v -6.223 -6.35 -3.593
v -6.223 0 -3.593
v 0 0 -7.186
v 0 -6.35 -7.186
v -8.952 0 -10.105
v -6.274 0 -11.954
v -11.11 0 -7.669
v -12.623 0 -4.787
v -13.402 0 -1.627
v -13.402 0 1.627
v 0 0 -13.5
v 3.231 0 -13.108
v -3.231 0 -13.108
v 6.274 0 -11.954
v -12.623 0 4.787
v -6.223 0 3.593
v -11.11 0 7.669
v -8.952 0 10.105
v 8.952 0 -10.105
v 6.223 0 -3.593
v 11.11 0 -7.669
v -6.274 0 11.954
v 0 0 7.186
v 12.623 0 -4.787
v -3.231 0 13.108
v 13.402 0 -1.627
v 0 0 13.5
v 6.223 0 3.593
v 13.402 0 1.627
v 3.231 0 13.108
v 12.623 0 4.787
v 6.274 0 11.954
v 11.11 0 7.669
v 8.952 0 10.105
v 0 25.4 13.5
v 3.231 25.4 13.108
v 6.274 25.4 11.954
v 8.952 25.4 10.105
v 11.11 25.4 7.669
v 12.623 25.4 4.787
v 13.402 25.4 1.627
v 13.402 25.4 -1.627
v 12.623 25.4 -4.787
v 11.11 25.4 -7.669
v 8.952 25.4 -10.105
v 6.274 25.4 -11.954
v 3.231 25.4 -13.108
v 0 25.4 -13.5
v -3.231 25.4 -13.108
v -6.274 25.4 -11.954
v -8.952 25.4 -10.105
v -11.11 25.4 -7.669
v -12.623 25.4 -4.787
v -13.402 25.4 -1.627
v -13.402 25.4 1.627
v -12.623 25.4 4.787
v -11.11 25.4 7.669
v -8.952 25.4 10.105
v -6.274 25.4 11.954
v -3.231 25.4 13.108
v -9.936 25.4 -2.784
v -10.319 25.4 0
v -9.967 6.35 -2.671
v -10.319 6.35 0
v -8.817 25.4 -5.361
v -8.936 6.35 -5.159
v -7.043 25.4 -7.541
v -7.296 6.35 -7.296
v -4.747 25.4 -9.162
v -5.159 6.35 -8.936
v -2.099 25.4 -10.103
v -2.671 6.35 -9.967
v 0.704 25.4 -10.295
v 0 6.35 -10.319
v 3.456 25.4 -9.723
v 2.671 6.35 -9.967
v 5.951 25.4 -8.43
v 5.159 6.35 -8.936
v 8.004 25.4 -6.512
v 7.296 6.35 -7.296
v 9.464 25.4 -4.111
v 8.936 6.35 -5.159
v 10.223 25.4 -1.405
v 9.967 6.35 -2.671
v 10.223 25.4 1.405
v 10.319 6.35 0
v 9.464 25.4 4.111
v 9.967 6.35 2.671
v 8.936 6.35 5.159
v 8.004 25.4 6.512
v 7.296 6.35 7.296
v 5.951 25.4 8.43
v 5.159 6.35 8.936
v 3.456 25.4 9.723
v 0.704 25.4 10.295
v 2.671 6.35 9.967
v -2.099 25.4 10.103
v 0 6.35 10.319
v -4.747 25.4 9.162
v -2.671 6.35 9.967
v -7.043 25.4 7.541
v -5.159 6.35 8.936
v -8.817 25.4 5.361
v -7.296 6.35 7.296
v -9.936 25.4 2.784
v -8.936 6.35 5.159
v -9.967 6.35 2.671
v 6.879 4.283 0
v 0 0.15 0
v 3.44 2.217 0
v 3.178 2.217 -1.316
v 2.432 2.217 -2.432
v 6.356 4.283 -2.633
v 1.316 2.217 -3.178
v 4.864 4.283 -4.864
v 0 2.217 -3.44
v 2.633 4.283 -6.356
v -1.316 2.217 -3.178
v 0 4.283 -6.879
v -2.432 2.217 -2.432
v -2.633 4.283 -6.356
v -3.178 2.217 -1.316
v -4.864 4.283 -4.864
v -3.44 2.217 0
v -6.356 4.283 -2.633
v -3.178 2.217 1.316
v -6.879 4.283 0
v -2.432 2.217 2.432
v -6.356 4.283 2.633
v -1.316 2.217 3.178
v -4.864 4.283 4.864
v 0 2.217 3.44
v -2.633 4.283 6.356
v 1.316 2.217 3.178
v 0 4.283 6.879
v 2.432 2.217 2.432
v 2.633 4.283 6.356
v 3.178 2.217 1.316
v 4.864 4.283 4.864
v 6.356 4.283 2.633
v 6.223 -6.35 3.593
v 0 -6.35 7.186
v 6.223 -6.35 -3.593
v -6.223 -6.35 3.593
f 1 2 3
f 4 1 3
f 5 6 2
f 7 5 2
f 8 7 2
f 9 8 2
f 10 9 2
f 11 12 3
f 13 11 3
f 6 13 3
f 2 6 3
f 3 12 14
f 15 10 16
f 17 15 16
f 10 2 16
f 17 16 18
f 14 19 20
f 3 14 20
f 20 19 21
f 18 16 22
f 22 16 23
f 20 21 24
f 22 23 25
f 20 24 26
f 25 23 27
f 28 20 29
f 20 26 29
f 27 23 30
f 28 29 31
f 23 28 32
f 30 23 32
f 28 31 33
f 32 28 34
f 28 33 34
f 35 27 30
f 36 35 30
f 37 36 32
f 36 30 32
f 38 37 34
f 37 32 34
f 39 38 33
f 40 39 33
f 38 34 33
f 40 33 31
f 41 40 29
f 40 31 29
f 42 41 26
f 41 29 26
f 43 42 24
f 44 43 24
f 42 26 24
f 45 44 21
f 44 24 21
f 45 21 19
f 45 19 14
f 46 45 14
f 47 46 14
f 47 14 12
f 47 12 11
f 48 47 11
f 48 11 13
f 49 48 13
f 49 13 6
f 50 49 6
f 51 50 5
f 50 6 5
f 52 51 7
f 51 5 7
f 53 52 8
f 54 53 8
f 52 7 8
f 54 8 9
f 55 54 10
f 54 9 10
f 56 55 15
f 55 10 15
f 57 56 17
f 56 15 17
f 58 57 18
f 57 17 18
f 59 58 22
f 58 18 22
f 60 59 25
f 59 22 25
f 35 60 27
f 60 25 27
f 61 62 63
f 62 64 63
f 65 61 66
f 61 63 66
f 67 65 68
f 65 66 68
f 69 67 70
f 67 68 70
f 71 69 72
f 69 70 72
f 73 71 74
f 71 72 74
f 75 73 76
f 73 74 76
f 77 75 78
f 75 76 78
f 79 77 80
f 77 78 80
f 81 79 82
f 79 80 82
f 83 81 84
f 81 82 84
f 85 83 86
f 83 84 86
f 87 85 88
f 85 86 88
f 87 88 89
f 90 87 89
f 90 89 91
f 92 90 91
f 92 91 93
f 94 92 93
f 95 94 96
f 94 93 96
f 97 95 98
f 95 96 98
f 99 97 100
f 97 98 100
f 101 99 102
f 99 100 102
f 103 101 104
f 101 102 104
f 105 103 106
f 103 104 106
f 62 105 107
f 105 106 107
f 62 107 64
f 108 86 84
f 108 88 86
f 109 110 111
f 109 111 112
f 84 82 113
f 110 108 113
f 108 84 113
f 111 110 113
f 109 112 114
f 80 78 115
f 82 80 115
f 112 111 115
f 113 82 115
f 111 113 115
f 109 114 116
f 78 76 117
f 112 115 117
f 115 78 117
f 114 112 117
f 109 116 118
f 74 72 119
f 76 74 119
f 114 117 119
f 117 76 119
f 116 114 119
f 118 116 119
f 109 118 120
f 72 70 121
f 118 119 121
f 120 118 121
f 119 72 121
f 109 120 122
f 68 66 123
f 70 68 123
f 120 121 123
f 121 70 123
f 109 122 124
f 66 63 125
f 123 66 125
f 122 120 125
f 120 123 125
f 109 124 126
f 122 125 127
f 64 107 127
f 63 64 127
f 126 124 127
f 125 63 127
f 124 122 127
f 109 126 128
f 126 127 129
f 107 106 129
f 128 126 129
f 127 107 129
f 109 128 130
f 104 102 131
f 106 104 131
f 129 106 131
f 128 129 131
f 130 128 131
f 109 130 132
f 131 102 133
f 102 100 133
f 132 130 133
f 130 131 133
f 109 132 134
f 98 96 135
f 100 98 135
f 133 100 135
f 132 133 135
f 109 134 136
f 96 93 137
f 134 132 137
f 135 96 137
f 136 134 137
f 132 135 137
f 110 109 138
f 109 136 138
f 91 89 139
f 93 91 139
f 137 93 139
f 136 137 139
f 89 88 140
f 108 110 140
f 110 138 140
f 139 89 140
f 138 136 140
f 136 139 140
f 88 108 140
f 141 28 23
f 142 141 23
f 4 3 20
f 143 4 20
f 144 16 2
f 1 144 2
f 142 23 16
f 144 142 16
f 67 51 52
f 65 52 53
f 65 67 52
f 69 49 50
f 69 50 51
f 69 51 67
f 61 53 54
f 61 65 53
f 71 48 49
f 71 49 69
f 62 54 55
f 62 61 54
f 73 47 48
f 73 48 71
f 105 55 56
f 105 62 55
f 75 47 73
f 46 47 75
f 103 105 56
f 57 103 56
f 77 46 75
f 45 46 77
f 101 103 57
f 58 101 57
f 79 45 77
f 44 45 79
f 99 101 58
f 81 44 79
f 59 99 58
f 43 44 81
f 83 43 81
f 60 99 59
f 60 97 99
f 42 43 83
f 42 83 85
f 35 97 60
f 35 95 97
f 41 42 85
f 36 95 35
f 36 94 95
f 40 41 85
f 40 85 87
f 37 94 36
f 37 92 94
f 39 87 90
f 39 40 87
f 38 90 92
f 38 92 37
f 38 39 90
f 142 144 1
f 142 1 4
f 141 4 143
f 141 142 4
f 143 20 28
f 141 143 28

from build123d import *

# Parameters (mm, degrees)
SKETCH1_R                   = 13.5
BOSS_EXTRUDE1_DEPTH         = 25.4
F_7_8_14_TAPPED_HOLE1_D     = 20.6375
F_7_8_14_TAPPED_HOLE1_DEPTH = 19.05
F_7_8_14_TAPPED_HOLE1_TIP   = 6.200130513
BOSS_EXTRUDE2_DEPTH         = 6.35


with BuildPart() as part:
    # Sketch1 → Boss-Extrude1 (new body)
    with BuildSketch(Plane(origin=(0, 0, 0), x_dir=(1, 0, 0), z_dir=(0, 1, 0))):
        with Locations(Location((0, 0, 0), (0, 0, 270))):
            Circle(SKETCH1_R)
    extrude(amount=BOSS_EXTRUDE1_DEPTH)

    # 7/8-14 Tapped Hole1
    with Locations(Plane(origin=(0, 25.4, 0), x_dir=(1, 0, 0), z_dir=(0, 1, 0))):
        with Locations((0, 0)):
            Hole(F_7_8_14_TAPPED_HOLE1_D / 2, depth=F_7_8_14_TAPPED_HOLE1_DEPTH)
            with Locations((0, 0, -(F_7_8_14_TAPPED_HOLE1_DEPTH + F_7_8_14_TAPPED_HOLE1_TIP / 2))):  # 118° drill point
                Cone(0, F_7_8_14_TAPPED_HOLE1_D / 2, F_7_8_14_TAPPED_HOLE1_TIP, mode=Mode.SUBTRACT)

    # Sketch6 → Boss-Extrude2 (add)
    with BuildSketch(Plane.XZ):
        Polygon((6.223, 3.592850725), (0, 7.18570145), (-6.223, 3.592850725), (-6.223, -3.592850725), (0, -7.18570145), (6.223, -3.592850725), align=None)
    extrude(amount=BOSS_EXTRUDE2_DEPTH)


solid = part.part
